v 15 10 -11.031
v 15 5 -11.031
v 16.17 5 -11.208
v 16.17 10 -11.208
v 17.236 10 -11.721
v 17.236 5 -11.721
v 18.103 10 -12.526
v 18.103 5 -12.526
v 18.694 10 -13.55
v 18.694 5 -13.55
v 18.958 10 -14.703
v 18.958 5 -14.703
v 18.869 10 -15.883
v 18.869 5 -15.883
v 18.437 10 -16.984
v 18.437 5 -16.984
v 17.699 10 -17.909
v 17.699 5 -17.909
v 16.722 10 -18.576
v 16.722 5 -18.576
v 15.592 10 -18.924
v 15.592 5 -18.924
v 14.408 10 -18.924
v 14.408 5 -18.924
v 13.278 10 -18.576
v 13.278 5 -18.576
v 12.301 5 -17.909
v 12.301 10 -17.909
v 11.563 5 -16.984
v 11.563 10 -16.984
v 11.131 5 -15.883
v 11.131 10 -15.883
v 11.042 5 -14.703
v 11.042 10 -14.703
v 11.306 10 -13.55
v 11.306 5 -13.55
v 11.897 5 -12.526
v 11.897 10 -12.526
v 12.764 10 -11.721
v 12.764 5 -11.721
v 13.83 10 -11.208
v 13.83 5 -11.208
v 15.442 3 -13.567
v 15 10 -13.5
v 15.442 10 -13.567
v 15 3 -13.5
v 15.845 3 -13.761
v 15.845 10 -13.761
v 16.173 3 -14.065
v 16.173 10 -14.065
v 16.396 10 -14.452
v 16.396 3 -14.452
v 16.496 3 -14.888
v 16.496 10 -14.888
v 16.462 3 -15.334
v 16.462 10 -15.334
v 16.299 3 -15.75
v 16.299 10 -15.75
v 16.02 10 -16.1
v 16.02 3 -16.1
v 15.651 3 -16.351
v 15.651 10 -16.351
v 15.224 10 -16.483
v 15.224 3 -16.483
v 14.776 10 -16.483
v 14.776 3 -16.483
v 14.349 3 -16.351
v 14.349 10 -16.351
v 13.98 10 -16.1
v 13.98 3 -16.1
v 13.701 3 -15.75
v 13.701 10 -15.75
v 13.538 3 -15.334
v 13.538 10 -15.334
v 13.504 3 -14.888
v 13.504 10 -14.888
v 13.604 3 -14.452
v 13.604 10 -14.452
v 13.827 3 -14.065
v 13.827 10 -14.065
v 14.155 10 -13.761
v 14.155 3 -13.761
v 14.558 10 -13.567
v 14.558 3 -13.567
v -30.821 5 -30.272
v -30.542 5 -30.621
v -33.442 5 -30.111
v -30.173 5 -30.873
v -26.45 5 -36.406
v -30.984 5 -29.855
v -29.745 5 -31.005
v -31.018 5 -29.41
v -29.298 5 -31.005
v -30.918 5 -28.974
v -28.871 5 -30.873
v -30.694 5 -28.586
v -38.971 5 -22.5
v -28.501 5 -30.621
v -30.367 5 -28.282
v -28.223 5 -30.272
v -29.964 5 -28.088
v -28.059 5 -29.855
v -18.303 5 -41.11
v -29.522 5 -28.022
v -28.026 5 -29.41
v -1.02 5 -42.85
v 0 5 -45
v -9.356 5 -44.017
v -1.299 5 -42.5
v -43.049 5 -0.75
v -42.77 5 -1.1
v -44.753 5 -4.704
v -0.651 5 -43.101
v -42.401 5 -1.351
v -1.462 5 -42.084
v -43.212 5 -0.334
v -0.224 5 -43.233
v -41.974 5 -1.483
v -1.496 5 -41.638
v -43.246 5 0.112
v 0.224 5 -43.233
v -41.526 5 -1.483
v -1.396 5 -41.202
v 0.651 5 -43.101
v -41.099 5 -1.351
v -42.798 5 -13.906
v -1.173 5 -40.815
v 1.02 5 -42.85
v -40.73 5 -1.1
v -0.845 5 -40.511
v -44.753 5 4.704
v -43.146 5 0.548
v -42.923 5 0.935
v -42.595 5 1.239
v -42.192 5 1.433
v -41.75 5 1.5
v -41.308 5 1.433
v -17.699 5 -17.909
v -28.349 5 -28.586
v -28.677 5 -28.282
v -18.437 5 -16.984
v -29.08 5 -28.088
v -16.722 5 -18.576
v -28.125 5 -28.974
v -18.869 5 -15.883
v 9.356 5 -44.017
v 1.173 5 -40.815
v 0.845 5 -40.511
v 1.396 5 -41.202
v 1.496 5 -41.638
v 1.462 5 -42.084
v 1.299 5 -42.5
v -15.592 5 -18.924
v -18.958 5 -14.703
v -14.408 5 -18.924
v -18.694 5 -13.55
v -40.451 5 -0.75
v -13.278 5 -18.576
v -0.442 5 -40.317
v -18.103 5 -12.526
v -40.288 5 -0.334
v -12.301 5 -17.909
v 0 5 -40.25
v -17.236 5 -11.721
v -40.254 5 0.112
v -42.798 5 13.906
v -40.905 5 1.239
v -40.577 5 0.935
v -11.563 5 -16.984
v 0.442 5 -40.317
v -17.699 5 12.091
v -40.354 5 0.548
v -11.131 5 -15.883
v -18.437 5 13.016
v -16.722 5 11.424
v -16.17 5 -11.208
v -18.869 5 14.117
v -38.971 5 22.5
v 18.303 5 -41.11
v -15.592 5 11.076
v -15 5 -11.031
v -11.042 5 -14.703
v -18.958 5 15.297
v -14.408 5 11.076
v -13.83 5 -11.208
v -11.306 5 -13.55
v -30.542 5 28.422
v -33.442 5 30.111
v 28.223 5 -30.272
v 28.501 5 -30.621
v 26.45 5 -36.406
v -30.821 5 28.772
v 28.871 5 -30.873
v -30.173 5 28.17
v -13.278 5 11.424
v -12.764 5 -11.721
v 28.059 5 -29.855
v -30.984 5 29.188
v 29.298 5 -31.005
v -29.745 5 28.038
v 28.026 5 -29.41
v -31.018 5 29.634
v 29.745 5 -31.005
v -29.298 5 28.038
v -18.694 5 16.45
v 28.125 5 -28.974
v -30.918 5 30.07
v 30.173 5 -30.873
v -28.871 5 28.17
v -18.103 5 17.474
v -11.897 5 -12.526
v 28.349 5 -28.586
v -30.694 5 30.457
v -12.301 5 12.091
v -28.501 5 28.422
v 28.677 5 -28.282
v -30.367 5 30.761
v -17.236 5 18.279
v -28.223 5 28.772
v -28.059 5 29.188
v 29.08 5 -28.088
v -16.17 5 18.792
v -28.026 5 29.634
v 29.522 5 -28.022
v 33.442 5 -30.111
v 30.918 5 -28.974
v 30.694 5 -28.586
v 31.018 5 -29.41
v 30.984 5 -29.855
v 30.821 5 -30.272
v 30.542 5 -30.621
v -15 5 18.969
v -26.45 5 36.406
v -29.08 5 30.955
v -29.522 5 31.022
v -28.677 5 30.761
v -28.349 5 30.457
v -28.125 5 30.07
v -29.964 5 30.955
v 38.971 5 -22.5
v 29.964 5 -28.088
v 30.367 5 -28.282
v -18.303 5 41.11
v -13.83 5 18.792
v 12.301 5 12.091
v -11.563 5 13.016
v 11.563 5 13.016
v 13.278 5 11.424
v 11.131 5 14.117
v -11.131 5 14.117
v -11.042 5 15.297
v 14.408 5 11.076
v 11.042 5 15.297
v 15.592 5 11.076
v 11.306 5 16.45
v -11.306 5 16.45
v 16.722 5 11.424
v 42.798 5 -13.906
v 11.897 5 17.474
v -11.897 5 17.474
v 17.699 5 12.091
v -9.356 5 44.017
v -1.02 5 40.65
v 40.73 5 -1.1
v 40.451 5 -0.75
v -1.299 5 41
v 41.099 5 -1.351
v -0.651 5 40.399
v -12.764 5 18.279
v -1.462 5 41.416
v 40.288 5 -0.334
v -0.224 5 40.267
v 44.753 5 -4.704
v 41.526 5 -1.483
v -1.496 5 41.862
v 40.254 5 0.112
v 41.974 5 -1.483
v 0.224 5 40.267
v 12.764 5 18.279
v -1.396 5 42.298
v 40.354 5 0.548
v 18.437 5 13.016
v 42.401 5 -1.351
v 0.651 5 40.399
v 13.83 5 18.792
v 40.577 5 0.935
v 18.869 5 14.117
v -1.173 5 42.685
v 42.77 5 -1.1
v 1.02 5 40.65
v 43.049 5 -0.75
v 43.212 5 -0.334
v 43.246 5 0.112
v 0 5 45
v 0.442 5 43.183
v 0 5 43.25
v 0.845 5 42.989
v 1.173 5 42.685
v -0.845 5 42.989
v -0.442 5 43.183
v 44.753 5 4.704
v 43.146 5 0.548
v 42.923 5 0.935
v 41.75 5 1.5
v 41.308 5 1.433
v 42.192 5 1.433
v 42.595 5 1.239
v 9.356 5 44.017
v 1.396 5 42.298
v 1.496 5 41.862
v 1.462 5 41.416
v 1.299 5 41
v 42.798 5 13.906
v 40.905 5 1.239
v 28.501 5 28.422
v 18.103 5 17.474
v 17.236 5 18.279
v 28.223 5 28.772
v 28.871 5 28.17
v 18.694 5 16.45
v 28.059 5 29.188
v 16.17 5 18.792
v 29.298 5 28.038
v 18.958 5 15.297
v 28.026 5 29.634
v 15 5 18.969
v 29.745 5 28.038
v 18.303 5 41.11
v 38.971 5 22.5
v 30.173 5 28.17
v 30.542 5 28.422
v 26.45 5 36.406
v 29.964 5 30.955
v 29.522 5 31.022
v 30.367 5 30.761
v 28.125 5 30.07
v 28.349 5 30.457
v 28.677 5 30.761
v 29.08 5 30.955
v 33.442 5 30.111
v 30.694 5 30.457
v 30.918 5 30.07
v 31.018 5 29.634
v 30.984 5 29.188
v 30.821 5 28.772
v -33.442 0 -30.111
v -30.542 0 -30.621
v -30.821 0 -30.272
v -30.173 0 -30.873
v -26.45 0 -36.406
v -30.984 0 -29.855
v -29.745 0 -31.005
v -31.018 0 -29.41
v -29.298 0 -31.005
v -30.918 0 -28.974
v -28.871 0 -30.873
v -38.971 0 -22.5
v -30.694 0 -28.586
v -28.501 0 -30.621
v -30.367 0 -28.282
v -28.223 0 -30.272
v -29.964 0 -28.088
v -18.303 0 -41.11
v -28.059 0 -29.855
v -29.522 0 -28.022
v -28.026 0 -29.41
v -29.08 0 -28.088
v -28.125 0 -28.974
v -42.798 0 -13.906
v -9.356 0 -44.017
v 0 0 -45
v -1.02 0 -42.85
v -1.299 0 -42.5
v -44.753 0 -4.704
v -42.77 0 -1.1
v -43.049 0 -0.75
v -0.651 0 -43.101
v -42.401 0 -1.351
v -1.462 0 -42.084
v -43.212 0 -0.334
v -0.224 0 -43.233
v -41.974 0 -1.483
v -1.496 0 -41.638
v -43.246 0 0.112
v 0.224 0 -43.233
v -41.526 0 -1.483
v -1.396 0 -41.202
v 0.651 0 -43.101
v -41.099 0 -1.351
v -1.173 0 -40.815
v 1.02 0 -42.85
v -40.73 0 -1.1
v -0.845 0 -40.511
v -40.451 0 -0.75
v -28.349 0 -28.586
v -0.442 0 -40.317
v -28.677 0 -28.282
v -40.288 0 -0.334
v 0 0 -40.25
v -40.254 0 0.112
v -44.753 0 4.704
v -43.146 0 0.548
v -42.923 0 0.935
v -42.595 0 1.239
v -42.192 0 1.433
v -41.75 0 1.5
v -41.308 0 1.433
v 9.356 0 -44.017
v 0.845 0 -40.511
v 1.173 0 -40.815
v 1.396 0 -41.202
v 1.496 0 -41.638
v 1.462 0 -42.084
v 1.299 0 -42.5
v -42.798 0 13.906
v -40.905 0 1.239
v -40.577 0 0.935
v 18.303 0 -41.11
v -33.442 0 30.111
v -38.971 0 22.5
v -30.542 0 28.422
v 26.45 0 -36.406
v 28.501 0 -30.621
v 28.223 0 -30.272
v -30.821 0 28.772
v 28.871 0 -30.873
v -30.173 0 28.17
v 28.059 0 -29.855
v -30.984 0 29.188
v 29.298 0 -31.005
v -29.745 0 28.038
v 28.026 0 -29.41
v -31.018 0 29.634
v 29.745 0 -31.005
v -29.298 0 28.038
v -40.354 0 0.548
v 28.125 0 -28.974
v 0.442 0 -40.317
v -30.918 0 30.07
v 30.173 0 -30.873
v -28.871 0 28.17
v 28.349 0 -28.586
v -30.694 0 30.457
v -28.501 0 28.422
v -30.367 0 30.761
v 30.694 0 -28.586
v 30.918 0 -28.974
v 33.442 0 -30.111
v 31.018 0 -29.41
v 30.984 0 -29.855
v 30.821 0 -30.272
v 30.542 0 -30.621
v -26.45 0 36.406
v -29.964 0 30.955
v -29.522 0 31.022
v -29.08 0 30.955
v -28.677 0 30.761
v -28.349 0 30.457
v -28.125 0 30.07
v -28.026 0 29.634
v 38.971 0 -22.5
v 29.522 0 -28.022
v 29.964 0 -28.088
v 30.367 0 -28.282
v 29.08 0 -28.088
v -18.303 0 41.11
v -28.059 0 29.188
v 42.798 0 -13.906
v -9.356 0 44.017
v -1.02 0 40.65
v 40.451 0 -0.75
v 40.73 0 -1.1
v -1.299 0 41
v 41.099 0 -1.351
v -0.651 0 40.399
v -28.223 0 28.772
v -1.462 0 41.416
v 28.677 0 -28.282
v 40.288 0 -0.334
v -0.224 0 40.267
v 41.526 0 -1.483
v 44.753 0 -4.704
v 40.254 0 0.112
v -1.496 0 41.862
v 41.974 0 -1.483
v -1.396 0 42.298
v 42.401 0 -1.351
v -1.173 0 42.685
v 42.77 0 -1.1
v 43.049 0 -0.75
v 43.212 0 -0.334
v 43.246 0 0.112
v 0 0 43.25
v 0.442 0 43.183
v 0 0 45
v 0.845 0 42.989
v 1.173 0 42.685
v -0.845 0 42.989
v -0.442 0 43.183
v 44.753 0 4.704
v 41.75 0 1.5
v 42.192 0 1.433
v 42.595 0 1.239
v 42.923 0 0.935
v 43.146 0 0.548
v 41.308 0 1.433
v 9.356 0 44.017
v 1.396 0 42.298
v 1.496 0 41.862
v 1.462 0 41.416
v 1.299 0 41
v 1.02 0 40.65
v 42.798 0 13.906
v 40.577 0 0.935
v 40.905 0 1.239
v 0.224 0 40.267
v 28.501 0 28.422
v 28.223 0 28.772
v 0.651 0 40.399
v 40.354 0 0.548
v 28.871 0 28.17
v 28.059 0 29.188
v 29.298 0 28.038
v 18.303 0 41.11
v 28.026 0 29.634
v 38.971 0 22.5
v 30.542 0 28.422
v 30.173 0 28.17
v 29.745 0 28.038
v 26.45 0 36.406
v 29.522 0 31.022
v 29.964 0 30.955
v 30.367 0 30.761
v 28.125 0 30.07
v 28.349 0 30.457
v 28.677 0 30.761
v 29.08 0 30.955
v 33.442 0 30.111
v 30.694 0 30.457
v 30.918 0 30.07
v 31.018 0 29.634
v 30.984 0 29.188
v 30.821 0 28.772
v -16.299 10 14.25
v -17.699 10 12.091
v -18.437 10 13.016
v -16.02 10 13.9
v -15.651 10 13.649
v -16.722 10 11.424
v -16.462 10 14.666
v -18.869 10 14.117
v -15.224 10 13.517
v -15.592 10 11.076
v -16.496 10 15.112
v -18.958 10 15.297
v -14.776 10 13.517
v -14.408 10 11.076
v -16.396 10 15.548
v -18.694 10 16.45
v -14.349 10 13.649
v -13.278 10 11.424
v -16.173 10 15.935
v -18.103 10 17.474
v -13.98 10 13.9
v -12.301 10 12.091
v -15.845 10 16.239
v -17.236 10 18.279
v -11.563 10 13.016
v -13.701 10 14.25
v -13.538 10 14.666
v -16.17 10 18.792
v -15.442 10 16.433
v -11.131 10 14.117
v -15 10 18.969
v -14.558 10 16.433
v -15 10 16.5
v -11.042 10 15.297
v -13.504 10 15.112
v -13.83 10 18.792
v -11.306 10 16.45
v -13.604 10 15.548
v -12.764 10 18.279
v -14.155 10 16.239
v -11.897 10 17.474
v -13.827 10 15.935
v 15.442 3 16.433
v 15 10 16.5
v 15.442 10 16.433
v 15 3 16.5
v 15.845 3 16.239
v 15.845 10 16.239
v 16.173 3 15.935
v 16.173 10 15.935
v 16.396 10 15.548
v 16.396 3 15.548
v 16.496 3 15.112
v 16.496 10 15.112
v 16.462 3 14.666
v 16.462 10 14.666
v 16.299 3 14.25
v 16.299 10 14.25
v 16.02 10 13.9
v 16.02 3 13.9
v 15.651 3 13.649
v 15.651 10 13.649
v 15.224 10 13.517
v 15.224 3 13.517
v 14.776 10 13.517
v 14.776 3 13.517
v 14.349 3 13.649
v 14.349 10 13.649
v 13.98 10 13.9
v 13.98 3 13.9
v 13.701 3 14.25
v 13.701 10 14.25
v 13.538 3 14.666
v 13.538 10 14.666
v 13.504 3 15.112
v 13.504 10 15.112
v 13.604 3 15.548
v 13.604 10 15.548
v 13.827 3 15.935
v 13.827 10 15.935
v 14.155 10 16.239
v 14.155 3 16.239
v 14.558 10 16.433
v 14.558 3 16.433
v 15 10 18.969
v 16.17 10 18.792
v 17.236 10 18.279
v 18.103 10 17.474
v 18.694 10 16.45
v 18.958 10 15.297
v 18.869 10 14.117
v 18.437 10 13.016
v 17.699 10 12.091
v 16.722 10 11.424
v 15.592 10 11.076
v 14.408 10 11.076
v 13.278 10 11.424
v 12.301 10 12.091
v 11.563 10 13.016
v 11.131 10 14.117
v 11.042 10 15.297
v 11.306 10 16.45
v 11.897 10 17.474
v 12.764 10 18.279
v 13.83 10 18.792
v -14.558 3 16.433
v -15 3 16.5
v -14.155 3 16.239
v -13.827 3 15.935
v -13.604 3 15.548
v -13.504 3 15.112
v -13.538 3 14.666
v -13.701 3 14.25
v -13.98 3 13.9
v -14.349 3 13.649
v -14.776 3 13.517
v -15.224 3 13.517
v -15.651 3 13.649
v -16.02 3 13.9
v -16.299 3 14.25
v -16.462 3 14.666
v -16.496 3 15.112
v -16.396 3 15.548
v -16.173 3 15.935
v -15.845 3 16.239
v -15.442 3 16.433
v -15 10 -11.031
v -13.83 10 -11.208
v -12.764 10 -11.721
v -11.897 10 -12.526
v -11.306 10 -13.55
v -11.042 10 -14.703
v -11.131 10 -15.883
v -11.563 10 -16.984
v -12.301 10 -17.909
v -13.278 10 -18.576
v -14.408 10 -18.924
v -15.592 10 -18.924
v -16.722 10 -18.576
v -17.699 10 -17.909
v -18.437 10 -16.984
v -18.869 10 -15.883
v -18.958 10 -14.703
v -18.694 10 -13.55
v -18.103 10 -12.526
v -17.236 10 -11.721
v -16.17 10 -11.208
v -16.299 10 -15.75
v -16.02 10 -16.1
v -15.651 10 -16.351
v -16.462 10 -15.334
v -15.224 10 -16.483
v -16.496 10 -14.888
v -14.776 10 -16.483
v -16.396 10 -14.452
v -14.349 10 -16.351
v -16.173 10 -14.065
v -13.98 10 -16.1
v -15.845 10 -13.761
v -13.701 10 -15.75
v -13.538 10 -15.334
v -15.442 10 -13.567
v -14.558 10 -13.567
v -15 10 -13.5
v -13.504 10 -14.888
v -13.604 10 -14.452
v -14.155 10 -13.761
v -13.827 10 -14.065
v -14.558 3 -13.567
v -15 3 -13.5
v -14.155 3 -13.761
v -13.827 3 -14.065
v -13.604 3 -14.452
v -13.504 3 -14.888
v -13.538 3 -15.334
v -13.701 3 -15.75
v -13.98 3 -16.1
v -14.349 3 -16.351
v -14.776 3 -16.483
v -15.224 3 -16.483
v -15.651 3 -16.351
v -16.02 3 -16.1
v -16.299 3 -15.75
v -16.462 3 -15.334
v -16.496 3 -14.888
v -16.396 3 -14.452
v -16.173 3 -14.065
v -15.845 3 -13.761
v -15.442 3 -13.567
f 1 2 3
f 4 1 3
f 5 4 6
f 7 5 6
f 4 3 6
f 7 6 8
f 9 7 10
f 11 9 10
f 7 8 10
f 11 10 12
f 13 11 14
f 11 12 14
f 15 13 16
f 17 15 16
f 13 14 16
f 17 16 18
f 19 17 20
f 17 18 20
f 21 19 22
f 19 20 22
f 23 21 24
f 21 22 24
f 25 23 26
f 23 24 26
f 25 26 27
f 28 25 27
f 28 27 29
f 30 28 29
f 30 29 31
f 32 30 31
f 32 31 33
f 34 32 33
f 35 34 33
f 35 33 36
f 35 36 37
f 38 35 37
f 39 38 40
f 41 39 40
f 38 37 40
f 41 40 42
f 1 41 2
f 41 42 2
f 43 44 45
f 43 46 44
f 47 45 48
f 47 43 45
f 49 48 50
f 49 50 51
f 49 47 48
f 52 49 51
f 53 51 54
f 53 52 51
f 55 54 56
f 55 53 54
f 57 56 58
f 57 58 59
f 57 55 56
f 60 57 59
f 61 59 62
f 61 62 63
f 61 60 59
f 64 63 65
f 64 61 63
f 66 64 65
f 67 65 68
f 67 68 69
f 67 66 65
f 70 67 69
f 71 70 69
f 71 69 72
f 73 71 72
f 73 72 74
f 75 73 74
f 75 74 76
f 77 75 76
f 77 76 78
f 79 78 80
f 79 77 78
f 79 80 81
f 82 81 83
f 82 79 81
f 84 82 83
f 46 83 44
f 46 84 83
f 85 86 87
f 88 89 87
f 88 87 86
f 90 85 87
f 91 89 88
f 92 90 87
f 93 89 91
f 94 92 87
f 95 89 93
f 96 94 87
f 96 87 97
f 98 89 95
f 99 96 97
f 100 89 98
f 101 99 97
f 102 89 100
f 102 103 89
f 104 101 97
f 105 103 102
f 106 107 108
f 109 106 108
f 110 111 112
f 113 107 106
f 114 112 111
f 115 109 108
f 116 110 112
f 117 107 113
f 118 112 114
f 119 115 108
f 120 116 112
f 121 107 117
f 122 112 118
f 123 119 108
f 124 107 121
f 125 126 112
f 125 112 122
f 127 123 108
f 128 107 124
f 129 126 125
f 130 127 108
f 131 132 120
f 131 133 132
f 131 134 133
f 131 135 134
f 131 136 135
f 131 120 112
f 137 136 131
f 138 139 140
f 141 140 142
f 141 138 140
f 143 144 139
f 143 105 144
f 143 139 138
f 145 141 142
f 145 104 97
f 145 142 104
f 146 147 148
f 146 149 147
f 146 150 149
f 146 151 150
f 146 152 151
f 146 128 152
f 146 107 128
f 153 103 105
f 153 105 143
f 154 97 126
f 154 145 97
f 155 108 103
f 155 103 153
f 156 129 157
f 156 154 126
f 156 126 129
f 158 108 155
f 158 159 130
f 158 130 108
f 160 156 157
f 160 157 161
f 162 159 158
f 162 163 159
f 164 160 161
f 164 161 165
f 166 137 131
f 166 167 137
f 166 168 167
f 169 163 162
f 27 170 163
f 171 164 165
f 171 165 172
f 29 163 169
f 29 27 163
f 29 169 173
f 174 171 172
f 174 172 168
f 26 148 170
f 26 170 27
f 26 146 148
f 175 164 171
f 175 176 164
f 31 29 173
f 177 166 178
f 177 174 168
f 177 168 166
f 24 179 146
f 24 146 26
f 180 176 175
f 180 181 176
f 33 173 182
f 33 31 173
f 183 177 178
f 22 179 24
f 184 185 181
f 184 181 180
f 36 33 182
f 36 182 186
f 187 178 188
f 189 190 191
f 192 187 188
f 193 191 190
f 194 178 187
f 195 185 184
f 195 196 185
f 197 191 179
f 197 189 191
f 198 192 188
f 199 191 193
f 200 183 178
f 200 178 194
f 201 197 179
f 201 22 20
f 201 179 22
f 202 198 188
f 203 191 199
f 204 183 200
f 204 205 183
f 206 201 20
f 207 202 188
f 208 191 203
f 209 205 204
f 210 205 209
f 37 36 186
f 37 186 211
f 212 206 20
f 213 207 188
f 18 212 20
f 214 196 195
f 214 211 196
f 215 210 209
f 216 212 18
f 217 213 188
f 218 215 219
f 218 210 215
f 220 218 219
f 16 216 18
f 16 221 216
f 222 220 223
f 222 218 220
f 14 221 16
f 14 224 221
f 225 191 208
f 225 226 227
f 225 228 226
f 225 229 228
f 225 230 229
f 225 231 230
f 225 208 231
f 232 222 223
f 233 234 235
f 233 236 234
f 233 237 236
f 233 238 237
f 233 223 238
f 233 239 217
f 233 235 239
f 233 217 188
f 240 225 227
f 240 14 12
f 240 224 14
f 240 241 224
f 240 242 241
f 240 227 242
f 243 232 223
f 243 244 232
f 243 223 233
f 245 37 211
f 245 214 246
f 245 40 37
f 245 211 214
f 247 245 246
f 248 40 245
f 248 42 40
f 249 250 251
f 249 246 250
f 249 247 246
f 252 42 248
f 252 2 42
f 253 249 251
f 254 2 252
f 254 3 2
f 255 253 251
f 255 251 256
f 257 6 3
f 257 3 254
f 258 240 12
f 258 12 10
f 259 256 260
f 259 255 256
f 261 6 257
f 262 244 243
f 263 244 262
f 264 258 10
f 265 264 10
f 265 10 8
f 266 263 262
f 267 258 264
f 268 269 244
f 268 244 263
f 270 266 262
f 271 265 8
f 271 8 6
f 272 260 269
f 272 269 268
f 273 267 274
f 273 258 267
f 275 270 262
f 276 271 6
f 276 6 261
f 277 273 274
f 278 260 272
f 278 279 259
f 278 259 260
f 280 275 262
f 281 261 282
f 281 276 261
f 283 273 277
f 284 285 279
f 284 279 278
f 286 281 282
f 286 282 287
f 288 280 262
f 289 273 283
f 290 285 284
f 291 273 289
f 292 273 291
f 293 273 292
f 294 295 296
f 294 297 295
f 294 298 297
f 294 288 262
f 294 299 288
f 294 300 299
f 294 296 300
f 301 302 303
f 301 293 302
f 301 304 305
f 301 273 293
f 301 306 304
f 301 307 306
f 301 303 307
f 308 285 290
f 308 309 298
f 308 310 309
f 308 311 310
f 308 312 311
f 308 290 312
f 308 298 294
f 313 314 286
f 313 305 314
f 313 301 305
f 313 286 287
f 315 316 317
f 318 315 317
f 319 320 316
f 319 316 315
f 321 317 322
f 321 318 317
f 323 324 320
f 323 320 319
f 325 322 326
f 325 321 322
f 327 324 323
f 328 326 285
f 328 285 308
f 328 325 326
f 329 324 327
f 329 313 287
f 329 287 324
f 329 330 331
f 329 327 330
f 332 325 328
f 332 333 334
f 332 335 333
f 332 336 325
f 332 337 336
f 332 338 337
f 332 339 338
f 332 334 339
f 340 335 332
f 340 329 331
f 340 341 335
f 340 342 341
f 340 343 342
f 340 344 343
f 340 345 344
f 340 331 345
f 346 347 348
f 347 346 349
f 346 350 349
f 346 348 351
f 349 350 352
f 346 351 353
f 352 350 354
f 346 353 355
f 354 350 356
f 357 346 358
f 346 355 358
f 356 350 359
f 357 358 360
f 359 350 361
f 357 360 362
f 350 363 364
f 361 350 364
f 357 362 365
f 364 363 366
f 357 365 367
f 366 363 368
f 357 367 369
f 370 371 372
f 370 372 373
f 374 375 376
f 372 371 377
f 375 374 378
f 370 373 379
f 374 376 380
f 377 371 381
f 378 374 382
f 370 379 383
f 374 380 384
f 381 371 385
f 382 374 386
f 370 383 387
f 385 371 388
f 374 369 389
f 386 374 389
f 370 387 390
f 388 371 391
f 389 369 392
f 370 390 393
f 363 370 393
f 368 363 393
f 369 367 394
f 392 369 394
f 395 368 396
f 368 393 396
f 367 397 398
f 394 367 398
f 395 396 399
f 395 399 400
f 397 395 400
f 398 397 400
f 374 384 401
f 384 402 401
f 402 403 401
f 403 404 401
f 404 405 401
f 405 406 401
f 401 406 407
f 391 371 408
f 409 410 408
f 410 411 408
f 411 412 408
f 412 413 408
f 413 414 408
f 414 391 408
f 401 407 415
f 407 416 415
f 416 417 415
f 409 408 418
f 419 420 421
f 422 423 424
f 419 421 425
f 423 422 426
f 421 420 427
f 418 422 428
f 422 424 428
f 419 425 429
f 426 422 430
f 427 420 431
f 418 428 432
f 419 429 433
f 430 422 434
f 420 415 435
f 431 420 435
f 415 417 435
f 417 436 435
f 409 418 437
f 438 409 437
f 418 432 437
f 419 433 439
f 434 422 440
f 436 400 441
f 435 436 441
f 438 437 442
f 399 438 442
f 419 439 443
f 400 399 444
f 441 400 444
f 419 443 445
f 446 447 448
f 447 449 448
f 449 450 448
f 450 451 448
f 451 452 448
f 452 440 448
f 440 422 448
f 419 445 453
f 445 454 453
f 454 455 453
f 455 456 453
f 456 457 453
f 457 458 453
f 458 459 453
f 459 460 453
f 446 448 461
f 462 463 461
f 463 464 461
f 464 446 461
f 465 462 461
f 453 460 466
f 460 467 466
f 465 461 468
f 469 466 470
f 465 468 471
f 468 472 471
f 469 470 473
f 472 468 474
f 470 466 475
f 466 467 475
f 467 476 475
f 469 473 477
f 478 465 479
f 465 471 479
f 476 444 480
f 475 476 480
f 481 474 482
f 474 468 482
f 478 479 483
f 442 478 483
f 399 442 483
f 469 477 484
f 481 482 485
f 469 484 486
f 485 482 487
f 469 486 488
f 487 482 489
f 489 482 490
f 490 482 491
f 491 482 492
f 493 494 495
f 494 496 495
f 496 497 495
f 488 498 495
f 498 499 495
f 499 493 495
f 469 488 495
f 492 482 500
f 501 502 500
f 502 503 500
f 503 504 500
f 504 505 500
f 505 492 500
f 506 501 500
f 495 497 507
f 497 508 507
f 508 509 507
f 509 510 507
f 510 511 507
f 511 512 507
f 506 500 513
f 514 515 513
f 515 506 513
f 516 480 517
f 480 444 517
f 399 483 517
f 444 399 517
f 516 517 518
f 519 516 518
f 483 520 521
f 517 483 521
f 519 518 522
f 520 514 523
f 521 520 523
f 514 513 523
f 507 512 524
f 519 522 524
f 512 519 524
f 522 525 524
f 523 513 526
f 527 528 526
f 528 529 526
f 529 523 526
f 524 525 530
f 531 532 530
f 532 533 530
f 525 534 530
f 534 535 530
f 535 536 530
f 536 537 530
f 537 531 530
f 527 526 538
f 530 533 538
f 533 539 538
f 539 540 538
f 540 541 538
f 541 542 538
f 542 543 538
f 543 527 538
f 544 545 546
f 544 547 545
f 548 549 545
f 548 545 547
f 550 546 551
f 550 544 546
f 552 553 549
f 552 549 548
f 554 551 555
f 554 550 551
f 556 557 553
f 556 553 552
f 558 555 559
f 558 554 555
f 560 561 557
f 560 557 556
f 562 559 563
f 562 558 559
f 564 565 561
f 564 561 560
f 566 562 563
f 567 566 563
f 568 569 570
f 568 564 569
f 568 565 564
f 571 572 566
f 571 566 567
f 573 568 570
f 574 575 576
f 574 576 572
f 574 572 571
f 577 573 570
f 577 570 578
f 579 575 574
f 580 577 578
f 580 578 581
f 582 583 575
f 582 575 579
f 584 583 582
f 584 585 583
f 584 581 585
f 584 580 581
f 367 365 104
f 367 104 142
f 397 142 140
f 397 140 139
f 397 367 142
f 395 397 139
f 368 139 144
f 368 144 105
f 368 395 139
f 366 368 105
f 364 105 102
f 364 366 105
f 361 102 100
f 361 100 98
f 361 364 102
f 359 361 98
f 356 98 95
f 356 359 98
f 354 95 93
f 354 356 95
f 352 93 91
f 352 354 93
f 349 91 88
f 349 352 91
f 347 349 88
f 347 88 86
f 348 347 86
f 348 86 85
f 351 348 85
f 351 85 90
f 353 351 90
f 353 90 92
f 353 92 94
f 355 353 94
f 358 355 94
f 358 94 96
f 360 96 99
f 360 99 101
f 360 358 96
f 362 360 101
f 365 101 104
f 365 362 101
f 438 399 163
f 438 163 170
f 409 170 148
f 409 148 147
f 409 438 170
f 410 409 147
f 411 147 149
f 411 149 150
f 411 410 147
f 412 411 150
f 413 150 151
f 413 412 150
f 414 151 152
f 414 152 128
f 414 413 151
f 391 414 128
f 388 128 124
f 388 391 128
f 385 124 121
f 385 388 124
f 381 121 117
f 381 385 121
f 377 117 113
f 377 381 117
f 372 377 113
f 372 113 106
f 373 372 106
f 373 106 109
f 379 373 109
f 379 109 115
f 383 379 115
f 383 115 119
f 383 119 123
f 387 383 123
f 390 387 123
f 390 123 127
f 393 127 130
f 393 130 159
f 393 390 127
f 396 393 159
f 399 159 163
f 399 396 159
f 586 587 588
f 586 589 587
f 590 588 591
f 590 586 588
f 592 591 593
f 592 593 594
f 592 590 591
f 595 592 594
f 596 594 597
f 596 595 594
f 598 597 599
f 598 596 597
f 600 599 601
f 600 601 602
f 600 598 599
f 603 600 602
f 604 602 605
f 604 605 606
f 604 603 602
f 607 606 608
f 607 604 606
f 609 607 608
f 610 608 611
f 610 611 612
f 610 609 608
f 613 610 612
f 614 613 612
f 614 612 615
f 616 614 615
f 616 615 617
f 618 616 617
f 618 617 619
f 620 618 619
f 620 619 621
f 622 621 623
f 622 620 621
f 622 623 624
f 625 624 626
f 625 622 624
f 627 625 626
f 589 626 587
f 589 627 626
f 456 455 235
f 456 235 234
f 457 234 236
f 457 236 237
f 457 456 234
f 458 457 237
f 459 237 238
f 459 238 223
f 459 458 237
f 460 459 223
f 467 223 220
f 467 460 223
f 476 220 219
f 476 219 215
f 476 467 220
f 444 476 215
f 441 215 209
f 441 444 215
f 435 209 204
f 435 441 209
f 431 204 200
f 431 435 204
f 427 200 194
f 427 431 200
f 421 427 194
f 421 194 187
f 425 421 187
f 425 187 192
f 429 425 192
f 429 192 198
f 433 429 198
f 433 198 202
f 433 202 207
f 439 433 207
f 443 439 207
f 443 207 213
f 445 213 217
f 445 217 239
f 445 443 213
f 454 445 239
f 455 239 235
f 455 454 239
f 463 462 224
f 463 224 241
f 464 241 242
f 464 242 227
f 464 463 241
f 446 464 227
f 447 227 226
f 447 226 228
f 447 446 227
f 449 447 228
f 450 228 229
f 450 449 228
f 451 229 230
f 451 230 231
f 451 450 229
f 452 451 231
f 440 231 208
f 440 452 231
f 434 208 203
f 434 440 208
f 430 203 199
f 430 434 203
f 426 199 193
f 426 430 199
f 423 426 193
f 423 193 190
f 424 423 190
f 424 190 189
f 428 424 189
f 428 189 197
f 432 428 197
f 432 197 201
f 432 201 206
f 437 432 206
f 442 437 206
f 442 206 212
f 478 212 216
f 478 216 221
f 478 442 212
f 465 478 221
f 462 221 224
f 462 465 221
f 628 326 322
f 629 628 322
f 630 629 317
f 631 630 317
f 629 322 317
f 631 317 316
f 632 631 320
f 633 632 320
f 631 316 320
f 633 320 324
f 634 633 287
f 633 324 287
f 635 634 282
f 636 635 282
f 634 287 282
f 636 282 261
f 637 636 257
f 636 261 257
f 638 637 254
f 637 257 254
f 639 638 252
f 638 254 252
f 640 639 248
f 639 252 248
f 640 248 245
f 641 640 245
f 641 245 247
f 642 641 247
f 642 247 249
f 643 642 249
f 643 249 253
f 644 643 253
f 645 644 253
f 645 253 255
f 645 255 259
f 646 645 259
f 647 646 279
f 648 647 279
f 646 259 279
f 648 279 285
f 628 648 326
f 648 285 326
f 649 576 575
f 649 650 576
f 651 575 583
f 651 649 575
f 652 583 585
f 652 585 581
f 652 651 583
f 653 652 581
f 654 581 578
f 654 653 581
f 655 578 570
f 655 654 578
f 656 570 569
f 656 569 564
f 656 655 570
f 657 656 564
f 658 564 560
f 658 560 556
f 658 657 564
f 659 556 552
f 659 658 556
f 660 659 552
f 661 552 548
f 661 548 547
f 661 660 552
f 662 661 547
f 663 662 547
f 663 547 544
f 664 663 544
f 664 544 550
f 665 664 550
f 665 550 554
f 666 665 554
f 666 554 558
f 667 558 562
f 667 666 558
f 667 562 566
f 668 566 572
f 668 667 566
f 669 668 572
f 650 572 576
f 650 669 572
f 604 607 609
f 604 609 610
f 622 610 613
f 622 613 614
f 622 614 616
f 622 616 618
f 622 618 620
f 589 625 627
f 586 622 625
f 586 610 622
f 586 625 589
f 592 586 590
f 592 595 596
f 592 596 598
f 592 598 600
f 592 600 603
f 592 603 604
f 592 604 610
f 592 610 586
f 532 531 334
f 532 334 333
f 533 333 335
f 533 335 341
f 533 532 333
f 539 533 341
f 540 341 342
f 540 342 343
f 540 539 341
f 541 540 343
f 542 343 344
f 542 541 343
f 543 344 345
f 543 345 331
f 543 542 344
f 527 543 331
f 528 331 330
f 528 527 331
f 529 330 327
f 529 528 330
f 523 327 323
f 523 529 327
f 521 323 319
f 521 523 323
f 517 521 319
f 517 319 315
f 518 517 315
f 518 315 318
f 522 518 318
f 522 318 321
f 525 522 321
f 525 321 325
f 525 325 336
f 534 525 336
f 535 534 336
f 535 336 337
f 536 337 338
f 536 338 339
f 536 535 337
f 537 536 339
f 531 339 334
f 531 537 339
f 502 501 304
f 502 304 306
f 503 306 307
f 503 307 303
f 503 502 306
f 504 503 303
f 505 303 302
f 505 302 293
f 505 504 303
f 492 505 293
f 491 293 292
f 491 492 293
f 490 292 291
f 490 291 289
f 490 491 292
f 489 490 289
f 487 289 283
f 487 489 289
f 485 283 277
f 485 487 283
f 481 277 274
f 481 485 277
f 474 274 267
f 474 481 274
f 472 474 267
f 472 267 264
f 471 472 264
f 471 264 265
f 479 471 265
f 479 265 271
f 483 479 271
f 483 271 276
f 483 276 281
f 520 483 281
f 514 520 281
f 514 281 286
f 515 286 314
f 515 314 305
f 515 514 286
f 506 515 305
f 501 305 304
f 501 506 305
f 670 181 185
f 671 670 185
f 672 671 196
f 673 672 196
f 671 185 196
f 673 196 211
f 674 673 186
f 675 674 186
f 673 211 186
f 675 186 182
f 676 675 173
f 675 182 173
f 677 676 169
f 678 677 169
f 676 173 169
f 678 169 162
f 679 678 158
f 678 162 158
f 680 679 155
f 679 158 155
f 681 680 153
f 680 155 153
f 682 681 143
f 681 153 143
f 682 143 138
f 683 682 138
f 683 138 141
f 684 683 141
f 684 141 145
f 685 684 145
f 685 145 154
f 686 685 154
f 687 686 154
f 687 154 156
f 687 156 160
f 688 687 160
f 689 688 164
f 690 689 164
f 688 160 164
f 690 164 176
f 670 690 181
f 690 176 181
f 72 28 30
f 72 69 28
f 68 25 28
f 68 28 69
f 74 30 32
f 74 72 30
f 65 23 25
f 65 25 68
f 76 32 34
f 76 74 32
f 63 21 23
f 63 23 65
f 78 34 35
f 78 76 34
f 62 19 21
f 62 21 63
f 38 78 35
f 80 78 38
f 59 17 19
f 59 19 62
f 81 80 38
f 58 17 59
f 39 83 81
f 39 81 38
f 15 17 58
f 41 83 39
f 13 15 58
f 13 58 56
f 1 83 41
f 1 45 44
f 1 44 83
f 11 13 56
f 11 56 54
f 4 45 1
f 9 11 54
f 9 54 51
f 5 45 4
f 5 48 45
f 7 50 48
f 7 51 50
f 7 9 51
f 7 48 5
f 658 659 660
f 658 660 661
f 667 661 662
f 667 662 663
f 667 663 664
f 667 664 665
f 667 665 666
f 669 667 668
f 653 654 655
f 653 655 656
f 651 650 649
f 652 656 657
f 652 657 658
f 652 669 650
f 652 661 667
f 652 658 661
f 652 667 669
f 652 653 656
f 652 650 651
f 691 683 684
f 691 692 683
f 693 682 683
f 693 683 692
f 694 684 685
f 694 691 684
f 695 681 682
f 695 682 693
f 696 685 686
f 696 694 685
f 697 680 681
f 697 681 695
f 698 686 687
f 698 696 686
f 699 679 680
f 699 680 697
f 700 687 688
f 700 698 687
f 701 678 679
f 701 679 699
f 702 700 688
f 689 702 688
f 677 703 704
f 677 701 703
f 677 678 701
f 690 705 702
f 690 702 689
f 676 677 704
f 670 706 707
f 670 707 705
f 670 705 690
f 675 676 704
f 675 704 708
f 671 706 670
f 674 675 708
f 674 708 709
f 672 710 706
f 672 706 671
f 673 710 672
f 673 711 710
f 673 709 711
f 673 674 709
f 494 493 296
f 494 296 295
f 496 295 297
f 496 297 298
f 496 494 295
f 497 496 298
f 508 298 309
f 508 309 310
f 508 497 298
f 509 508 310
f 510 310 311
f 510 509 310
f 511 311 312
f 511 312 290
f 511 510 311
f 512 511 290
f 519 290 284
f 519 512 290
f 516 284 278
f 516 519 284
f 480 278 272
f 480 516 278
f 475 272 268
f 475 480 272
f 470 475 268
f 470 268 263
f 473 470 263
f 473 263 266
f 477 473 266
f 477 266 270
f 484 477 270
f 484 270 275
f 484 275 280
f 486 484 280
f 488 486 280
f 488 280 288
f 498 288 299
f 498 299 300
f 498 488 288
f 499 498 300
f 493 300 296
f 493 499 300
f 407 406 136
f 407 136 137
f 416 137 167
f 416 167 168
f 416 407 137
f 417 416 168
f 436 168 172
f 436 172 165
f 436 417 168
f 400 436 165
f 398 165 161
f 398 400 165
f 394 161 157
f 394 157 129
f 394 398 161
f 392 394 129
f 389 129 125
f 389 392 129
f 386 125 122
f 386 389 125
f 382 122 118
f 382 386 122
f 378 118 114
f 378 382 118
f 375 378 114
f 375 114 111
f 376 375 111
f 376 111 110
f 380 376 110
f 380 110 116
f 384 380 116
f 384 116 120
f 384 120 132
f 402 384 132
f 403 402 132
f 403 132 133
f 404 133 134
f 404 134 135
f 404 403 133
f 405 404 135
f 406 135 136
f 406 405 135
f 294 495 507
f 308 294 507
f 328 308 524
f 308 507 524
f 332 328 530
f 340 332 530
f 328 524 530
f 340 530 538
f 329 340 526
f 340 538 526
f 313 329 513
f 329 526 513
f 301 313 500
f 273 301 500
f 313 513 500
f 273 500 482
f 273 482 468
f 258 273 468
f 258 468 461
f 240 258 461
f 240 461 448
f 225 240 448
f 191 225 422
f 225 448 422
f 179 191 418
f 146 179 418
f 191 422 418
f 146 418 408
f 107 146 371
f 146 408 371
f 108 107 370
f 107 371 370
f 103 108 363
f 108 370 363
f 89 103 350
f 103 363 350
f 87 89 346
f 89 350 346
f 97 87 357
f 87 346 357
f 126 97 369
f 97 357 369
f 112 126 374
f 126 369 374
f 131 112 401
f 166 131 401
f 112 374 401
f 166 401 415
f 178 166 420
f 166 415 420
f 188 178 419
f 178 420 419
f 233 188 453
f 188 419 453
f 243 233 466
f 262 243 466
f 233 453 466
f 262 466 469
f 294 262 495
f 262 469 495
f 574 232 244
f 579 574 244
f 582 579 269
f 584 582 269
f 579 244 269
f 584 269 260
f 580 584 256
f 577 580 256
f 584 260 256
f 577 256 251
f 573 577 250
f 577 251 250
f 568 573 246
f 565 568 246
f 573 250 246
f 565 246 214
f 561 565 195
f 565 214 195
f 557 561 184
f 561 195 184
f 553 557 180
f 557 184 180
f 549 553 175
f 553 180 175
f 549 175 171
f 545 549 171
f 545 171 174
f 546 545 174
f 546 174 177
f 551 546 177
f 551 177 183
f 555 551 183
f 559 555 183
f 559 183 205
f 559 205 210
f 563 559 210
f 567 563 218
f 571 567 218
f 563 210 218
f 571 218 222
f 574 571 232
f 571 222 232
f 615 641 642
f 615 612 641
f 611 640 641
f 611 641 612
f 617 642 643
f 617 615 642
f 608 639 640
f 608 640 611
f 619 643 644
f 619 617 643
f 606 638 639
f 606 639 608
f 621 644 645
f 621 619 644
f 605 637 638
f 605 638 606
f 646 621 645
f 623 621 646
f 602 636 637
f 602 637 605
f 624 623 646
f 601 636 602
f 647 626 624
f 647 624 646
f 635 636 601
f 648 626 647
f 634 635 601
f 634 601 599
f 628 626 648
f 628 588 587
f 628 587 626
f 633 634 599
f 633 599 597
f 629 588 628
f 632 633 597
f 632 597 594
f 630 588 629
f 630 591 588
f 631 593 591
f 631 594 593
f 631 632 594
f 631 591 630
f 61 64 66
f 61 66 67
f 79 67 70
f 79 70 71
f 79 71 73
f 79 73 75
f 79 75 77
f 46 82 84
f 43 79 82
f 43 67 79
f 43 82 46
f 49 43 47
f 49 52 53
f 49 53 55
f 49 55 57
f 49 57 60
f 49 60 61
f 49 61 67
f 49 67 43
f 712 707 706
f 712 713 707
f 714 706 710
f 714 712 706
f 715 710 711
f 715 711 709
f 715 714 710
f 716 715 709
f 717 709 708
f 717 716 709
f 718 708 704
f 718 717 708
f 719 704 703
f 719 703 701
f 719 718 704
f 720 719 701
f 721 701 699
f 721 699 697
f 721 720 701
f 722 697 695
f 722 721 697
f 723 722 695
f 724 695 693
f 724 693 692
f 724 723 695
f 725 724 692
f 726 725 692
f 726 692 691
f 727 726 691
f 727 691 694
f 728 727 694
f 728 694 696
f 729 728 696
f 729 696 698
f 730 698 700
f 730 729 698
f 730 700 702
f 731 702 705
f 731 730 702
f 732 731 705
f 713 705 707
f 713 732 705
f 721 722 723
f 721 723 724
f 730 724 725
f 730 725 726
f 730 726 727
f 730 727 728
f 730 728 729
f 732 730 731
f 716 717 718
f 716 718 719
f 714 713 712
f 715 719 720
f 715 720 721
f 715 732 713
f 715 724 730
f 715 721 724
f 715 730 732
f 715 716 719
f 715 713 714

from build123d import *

# Parameters (mm, degrees)
SKETCH1_R               = 45
SKETCH1_R_2             = 1.5
BOSS_EXTRUDE2_DEPTH     = 5
SKETCH2_R               = 3.96875
BOSS_EXTRUDE3_DEPTH     = 5
SKETCH3_R               = 1.5
CUT_EXTRUDE1_DEPTH      = 7
CUT_EXTRUDE2_DEPTH      = 27
CUT_EXTRUDE2_DEPTH_BACK = 19
SKETCH4_W               = 27.9375
SKETCH4_H               = 5
SKETCH5_W               = 38.057412374
SKETCH5_H               = 36.402742271
BOSS_EXTRUDE4_DEPTH     = 4
SKETCH6_R               = 3.96875
SKETCH6_R_2             = 1.5
BOSS_EXTRUDE5_DEPTH     = 5
CUT_EXTRUDE3_START      = -2
SKETCH6_2_R             = 1.5
CUT_EXTRUDE3_DEPTH      = 2


with BuildPart() as part:
    # Sketch1 → Boss-Extrude2 (new body)
    with BuildSketch(Plane(origin=(0, 0, 0), x_dir=(1, 0, 0), z_dir=(0, 1, 0))):
        Circle(SKETCH1_R)
        with Locations((0, 41.75)):
            Circle(SKETCH1_R_2, mode=Mode.SUBTRACT)
        with Locations((29.521708115, 29.521708115)):
            Circle(SKETCH1_R_2, mode=Mode.SUBTRACT)
        with Locations((41.75, 0)):
            Circle(SKETCH1_R_2, mode=Mode.SUBTRACT)
        with Locations((29.521708115, -29.521708115)):
            Circle(SKETCH1_R_2, mode=Mode.SUBTRACT)
        with Locations((0, -41.75)):
            Circle(SKETCH1_R_2, mode=Mode.SUBTRACT)
        with Locations((-29.521708115, -29.521708115)):
            Circle(SKETCH1_R_2, mode=Mode.SUBTRACT)
        with Locations((-41.75, 0)):
            Circle(SKETCH1_R_2, mode=Mode.SUBTRACT)
        with Locations((-29.521708115, 29.521708115)):
            Circle(SKETCH1_R_2, mode=Mode.SUBTRACT)
    extrude(amount=BOSS_EXTRUDE2_DEPTH)

    # Sketch2 → Boss-Extrude3 (add)
    with BuildSketch(Plane(origin=(0, 5, 0), x_dir=(1, 0, 0), z_dir=(0, 1, 0))):
        with Locations((-10, 10)):
            Circle(SKETCH2_R)
        with Locations((10, 10)):
            Circle(SKETCH2_R)
        with Locations((10, -10)):
            Circle(SKETCH2_R)
        with Locations((-10, -10)):
            Circle(SKETCH2_R)
    extrude(amount=BOSS_EXTRUDE3_DEPTH)

    # Sketch3 → Cut-Extrude1 (cut)
    with BuildSketch(Plane(origin=(0, 10, 0), x_dir=(1, 0, 0), z_dir=(0, 1, 0))):
        with Locations((-10, 10)):
            Circle(SKETCH3_R)
        with Locations((10, 10)):
            Circle(SKETCH3_R)
        with Locations((-10, -10)):
            Circle(SKETCH3_R)
        with Locations((10, -10)):
            Circle(SKETCH3_R)
    extrude(amount=-CUT_EXTRUDE1_DEPTH, mode=Mode.SUBTRACT)

    # Sketch4 → Cut-Extrude2 (cut, two sides: drawn at the far end of the back side and taken through both)
    with BuildSketch(Plane.XY.offset(-CUT_EXTRUDE2_DEPTH_BACK)):
        with Locations((0, 7.5)):
            Rectangle(SKETCH4_W, SKETCH4_H)
    extrude(amount=CUT_EXTRUDE2_DEPTH + CUT_EXTRUDE2_DEPTH_BACK, mode=Mode.SUBTRACT)

    # Sketch5 → Boss-Extrude4 (add)
    with BuildSketch(Plane(origin=(0, 5, 0), x_dir=(1, 0, 0), z_dir=(0, 1, 0))):
        with Locations((0.472762887, -0.413667525)):
            Rectangle(SKETCH5_W, SKETCH5_H)
    extrude(amount=-BOSS_EXTRUDE4_DEPTH)

    # Sketch6 → Boss-Extrude5 (add)
    # profile 1 of 4: a face of its own
    with BuildSketch(Plane(origin=(0, 5, 0), x_dir=(1, 0, 0), z_dir=(0, 1, 0))):
        with Locations((-15, 15)):
            Circle(SKETCH6_R)
        with Locations((-15, 15)):
            Circle(SKETCH6_R_2, mode=Mode.SUBTRACT)
    # profile 2 of 4: a face of its own
    with BuildSketch(Plane(origin=(0, 5, 0), x_dir=(1, 0, 0), z_dir=(0, 1, 0))):
        with Locations((15, 15)):
            Circle(SKETCH6_R)
        with Locations((15, 15)):
            Circle(SKETCH6_R_2, mode=Mode.SUBTRACT)
    # profile 3 of 4: a face of its own
    with BuildSketch(Plane(origin=(0, 5, 0), x_dir=(1, 0, 0), z_dir=(0, 1, 0))):
        with Locations((15, -15)):
            Circle(SKETCH6_R)
        with Locations((15, -15)):
            Circle(SKETCH6_R_2, mode=Mode.SUBTRACT)
    # profile 4 of 4: a face of its own
    with BuildSketch(Plane(origin=(0, 5, 0), x_dir=(1, 0, 0), z_dir=(0, 1, 0))):
        with Locations((-15, -15)):
            Circle(SKETCH6_R)
        with Locations((-15, -15)):
            Circle(SKETCH6_R_2, mode=Mode.SUBTRACT)
    extrude(amount=BOSS_EXTRUDE5_DEPTH)

    # Sketch6<2> → Cut-Extrude3 (cut)
    with BuildSketch(Plane(origin=(0, 5, 0), x_dir=(1, 0, 0), z_dir=(0, 1, 0)).offset(CUT_EXTRUDE3_START)):
        with Locations((-15, 15)):
            Circle(SKETCH6_2_R)
        with Locations((15, 15)):
            Circle(SKETCH6_2_R)
        with Locations((15, -15)):
            Circle(SKETCH6_2_R)
        with Locations((-15, -15)):
            Circle(SKETCH6_2_R)
    extrude(amount=CUT_EXTRUDE3_DEPTH, mode=Mode.SUBTRACT)


solid = part.part
